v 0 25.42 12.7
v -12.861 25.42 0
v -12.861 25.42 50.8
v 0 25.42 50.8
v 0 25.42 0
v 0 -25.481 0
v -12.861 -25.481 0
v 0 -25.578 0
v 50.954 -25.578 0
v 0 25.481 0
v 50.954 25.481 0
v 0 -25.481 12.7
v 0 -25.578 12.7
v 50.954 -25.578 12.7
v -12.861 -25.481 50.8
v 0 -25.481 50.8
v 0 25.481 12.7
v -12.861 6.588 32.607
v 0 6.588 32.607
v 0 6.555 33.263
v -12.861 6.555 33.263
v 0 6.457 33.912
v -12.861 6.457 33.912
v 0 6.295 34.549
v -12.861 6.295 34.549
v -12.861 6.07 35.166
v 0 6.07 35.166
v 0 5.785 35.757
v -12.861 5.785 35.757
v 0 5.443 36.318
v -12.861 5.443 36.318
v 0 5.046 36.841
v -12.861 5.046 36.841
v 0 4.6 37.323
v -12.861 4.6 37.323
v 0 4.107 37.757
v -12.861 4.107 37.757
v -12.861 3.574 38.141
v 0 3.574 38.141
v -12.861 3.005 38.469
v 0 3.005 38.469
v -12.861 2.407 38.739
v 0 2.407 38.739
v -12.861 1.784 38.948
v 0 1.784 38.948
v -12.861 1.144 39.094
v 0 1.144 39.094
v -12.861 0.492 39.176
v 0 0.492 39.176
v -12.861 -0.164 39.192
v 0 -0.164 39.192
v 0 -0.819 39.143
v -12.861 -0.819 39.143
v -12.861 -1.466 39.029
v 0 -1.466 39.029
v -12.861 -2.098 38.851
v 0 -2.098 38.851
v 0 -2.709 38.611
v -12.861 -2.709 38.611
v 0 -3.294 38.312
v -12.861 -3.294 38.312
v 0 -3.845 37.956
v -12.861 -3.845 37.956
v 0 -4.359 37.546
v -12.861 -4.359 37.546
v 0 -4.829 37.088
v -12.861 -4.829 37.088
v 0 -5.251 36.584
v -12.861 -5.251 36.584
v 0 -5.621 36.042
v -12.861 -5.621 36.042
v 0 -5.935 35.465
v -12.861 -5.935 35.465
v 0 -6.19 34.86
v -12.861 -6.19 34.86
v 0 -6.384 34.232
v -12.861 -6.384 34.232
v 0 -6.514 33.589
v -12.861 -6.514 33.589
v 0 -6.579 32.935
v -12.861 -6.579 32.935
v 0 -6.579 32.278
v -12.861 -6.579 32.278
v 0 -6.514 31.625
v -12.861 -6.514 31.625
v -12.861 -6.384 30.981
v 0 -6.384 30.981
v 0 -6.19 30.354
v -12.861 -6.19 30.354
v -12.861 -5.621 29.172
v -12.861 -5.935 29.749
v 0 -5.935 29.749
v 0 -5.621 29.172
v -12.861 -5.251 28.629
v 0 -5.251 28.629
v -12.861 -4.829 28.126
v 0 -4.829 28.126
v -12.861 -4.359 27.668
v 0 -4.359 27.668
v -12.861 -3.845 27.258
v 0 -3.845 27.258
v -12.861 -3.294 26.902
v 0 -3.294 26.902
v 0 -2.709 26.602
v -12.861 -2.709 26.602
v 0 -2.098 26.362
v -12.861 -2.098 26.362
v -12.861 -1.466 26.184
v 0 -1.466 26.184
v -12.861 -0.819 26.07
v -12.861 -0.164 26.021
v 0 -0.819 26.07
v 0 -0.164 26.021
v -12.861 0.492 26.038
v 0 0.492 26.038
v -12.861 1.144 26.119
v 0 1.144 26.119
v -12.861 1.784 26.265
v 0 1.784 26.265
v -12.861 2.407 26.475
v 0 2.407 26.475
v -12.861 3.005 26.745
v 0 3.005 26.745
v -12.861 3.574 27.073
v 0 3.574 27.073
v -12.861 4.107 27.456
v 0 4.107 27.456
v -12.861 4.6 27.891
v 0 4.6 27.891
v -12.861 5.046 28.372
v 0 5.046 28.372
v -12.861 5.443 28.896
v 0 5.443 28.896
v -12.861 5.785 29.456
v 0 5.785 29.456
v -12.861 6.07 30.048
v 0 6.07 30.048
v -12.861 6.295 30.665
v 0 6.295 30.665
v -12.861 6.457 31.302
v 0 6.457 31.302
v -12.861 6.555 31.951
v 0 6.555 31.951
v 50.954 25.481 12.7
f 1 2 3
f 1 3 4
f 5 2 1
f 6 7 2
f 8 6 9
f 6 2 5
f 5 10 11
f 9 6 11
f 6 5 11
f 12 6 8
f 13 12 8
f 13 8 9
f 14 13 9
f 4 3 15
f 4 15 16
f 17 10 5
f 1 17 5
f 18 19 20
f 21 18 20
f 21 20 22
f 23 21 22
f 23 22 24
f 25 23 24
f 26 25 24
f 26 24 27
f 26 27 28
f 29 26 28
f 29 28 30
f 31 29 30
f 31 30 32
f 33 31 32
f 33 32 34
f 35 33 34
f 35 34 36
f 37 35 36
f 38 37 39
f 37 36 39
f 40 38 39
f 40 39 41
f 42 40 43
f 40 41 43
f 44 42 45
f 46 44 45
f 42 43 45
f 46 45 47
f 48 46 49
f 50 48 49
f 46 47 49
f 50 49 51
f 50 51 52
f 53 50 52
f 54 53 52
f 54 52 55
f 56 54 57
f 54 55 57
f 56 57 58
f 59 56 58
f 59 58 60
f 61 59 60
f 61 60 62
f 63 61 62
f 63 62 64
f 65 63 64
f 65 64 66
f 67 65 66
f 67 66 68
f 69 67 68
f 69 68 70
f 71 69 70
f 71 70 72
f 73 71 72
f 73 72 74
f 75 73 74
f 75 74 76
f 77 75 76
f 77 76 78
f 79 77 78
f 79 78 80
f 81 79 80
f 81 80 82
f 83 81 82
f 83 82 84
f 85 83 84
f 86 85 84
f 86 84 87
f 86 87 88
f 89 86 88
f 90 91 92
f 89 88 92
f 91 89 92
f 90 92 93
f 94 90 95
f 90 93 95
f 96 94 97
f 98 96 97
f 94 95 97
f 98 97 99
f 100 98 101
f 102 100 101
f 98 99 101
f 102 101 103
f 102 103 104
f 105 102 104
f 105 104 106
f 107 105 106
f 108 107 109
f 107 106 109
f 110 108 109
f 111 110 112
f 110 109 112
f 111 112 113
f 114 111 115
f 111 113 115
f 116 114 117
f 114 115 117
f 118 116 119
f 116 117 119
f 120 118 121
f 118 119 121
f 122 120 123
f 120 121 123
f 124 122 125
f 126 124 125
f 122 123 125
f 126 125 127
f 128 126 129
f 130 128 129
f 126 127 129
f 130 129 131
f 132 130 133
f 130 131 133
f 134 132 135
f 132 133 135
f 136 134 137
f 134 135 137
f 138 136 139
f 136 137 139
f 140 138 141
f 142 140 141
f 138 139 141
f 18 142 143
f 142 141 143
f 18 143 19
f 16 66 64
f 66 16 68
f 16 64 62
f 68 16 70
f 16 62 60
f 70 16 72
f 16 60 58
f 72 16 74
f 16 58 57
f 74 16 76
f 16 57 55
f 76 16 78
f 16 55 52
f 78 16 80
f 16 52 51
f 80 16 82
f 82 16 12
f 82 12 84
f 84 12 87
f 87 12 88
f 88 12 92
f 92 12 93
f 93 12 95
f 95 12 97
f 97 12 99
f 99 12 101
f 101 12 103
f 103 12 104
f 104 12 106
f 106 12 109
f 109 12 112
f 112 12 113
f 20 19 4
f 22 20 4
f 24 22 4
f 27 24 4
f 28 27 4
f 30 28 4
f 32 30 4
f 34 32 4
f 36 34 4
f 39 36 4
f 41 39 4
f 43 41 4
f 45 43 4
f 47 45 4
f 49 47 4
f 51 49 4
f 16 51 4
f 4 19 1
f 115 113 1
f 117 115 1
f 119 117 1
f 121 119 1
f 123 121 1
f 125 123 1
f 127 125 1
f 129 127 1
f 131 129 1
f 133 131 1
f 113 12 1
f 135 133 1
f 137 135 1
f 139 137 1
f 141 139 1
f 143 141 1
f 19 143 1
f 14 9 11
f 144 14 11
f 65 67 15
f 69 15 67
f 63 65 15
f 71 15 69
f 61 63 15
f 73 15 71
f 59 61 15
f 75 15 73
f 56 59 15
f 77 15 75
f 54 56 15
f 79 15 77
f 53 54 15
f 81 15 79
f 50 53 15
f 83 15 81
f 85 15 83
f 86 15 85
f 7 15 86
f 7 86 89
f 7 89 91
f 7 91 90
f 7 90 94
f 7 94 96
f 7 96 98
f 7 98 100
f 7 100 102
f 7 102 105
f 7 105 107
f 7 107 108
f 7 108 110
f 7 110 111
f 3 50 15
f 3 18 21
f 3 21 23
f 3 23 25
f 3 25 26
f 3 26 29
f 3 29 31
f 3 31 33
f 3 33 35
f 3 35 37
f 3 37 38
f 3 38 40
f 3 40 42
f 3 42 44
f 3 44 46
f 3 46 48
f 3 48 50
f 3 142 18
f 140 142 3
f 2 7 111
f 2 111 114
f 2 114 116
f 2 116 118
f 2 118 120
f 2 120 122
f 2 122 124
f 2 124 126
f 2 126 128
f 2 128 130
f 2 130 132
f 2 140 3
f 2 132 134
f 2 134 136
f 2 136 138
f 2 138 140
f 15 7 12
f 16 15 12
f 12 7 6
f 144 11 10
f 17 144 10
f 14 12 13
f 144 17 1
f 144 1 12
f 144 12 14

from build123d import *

# Parameters (mm, degrees)
F2_DEPTH = 12.7
F1_W     = 12.8612825647
F1_H     = 50.9009920061
F3_DEPTH = 50.8
F4_R     = 6.5875733698
F5_DEPTH = 41.656


with BuildPart() as f2:
    # F0 (on Top) → F2 (new body)
    with BuildSketch(Plane.XY):
        Polygon((0, 25.4809688777), (0, 0), (0, -25.5783628672), (50.953771919, -25.5783628672), (50.953771919, 25.4809688777), align=None)
    extrude(amount=F2_DEPTH)

    # F1 (on Top) → F3 (join)
    with BuildSketch(Plane.XY):
        with Locations((-6.4306412823, -0.0304728746)):
            Rectangle(F1_W, F1_H)
    extrude(amount=F3_DEPTH)

    # F4 (on face) → F5 (cut)
    with BuildSketch(Plane.YZ):
        with Locations((0, 32.6068140566)):
            Circle(F4_R)
    extrude(amount=-F5_DEPTH, mode=Mode.SUBTRACT)


solid = f2.part
